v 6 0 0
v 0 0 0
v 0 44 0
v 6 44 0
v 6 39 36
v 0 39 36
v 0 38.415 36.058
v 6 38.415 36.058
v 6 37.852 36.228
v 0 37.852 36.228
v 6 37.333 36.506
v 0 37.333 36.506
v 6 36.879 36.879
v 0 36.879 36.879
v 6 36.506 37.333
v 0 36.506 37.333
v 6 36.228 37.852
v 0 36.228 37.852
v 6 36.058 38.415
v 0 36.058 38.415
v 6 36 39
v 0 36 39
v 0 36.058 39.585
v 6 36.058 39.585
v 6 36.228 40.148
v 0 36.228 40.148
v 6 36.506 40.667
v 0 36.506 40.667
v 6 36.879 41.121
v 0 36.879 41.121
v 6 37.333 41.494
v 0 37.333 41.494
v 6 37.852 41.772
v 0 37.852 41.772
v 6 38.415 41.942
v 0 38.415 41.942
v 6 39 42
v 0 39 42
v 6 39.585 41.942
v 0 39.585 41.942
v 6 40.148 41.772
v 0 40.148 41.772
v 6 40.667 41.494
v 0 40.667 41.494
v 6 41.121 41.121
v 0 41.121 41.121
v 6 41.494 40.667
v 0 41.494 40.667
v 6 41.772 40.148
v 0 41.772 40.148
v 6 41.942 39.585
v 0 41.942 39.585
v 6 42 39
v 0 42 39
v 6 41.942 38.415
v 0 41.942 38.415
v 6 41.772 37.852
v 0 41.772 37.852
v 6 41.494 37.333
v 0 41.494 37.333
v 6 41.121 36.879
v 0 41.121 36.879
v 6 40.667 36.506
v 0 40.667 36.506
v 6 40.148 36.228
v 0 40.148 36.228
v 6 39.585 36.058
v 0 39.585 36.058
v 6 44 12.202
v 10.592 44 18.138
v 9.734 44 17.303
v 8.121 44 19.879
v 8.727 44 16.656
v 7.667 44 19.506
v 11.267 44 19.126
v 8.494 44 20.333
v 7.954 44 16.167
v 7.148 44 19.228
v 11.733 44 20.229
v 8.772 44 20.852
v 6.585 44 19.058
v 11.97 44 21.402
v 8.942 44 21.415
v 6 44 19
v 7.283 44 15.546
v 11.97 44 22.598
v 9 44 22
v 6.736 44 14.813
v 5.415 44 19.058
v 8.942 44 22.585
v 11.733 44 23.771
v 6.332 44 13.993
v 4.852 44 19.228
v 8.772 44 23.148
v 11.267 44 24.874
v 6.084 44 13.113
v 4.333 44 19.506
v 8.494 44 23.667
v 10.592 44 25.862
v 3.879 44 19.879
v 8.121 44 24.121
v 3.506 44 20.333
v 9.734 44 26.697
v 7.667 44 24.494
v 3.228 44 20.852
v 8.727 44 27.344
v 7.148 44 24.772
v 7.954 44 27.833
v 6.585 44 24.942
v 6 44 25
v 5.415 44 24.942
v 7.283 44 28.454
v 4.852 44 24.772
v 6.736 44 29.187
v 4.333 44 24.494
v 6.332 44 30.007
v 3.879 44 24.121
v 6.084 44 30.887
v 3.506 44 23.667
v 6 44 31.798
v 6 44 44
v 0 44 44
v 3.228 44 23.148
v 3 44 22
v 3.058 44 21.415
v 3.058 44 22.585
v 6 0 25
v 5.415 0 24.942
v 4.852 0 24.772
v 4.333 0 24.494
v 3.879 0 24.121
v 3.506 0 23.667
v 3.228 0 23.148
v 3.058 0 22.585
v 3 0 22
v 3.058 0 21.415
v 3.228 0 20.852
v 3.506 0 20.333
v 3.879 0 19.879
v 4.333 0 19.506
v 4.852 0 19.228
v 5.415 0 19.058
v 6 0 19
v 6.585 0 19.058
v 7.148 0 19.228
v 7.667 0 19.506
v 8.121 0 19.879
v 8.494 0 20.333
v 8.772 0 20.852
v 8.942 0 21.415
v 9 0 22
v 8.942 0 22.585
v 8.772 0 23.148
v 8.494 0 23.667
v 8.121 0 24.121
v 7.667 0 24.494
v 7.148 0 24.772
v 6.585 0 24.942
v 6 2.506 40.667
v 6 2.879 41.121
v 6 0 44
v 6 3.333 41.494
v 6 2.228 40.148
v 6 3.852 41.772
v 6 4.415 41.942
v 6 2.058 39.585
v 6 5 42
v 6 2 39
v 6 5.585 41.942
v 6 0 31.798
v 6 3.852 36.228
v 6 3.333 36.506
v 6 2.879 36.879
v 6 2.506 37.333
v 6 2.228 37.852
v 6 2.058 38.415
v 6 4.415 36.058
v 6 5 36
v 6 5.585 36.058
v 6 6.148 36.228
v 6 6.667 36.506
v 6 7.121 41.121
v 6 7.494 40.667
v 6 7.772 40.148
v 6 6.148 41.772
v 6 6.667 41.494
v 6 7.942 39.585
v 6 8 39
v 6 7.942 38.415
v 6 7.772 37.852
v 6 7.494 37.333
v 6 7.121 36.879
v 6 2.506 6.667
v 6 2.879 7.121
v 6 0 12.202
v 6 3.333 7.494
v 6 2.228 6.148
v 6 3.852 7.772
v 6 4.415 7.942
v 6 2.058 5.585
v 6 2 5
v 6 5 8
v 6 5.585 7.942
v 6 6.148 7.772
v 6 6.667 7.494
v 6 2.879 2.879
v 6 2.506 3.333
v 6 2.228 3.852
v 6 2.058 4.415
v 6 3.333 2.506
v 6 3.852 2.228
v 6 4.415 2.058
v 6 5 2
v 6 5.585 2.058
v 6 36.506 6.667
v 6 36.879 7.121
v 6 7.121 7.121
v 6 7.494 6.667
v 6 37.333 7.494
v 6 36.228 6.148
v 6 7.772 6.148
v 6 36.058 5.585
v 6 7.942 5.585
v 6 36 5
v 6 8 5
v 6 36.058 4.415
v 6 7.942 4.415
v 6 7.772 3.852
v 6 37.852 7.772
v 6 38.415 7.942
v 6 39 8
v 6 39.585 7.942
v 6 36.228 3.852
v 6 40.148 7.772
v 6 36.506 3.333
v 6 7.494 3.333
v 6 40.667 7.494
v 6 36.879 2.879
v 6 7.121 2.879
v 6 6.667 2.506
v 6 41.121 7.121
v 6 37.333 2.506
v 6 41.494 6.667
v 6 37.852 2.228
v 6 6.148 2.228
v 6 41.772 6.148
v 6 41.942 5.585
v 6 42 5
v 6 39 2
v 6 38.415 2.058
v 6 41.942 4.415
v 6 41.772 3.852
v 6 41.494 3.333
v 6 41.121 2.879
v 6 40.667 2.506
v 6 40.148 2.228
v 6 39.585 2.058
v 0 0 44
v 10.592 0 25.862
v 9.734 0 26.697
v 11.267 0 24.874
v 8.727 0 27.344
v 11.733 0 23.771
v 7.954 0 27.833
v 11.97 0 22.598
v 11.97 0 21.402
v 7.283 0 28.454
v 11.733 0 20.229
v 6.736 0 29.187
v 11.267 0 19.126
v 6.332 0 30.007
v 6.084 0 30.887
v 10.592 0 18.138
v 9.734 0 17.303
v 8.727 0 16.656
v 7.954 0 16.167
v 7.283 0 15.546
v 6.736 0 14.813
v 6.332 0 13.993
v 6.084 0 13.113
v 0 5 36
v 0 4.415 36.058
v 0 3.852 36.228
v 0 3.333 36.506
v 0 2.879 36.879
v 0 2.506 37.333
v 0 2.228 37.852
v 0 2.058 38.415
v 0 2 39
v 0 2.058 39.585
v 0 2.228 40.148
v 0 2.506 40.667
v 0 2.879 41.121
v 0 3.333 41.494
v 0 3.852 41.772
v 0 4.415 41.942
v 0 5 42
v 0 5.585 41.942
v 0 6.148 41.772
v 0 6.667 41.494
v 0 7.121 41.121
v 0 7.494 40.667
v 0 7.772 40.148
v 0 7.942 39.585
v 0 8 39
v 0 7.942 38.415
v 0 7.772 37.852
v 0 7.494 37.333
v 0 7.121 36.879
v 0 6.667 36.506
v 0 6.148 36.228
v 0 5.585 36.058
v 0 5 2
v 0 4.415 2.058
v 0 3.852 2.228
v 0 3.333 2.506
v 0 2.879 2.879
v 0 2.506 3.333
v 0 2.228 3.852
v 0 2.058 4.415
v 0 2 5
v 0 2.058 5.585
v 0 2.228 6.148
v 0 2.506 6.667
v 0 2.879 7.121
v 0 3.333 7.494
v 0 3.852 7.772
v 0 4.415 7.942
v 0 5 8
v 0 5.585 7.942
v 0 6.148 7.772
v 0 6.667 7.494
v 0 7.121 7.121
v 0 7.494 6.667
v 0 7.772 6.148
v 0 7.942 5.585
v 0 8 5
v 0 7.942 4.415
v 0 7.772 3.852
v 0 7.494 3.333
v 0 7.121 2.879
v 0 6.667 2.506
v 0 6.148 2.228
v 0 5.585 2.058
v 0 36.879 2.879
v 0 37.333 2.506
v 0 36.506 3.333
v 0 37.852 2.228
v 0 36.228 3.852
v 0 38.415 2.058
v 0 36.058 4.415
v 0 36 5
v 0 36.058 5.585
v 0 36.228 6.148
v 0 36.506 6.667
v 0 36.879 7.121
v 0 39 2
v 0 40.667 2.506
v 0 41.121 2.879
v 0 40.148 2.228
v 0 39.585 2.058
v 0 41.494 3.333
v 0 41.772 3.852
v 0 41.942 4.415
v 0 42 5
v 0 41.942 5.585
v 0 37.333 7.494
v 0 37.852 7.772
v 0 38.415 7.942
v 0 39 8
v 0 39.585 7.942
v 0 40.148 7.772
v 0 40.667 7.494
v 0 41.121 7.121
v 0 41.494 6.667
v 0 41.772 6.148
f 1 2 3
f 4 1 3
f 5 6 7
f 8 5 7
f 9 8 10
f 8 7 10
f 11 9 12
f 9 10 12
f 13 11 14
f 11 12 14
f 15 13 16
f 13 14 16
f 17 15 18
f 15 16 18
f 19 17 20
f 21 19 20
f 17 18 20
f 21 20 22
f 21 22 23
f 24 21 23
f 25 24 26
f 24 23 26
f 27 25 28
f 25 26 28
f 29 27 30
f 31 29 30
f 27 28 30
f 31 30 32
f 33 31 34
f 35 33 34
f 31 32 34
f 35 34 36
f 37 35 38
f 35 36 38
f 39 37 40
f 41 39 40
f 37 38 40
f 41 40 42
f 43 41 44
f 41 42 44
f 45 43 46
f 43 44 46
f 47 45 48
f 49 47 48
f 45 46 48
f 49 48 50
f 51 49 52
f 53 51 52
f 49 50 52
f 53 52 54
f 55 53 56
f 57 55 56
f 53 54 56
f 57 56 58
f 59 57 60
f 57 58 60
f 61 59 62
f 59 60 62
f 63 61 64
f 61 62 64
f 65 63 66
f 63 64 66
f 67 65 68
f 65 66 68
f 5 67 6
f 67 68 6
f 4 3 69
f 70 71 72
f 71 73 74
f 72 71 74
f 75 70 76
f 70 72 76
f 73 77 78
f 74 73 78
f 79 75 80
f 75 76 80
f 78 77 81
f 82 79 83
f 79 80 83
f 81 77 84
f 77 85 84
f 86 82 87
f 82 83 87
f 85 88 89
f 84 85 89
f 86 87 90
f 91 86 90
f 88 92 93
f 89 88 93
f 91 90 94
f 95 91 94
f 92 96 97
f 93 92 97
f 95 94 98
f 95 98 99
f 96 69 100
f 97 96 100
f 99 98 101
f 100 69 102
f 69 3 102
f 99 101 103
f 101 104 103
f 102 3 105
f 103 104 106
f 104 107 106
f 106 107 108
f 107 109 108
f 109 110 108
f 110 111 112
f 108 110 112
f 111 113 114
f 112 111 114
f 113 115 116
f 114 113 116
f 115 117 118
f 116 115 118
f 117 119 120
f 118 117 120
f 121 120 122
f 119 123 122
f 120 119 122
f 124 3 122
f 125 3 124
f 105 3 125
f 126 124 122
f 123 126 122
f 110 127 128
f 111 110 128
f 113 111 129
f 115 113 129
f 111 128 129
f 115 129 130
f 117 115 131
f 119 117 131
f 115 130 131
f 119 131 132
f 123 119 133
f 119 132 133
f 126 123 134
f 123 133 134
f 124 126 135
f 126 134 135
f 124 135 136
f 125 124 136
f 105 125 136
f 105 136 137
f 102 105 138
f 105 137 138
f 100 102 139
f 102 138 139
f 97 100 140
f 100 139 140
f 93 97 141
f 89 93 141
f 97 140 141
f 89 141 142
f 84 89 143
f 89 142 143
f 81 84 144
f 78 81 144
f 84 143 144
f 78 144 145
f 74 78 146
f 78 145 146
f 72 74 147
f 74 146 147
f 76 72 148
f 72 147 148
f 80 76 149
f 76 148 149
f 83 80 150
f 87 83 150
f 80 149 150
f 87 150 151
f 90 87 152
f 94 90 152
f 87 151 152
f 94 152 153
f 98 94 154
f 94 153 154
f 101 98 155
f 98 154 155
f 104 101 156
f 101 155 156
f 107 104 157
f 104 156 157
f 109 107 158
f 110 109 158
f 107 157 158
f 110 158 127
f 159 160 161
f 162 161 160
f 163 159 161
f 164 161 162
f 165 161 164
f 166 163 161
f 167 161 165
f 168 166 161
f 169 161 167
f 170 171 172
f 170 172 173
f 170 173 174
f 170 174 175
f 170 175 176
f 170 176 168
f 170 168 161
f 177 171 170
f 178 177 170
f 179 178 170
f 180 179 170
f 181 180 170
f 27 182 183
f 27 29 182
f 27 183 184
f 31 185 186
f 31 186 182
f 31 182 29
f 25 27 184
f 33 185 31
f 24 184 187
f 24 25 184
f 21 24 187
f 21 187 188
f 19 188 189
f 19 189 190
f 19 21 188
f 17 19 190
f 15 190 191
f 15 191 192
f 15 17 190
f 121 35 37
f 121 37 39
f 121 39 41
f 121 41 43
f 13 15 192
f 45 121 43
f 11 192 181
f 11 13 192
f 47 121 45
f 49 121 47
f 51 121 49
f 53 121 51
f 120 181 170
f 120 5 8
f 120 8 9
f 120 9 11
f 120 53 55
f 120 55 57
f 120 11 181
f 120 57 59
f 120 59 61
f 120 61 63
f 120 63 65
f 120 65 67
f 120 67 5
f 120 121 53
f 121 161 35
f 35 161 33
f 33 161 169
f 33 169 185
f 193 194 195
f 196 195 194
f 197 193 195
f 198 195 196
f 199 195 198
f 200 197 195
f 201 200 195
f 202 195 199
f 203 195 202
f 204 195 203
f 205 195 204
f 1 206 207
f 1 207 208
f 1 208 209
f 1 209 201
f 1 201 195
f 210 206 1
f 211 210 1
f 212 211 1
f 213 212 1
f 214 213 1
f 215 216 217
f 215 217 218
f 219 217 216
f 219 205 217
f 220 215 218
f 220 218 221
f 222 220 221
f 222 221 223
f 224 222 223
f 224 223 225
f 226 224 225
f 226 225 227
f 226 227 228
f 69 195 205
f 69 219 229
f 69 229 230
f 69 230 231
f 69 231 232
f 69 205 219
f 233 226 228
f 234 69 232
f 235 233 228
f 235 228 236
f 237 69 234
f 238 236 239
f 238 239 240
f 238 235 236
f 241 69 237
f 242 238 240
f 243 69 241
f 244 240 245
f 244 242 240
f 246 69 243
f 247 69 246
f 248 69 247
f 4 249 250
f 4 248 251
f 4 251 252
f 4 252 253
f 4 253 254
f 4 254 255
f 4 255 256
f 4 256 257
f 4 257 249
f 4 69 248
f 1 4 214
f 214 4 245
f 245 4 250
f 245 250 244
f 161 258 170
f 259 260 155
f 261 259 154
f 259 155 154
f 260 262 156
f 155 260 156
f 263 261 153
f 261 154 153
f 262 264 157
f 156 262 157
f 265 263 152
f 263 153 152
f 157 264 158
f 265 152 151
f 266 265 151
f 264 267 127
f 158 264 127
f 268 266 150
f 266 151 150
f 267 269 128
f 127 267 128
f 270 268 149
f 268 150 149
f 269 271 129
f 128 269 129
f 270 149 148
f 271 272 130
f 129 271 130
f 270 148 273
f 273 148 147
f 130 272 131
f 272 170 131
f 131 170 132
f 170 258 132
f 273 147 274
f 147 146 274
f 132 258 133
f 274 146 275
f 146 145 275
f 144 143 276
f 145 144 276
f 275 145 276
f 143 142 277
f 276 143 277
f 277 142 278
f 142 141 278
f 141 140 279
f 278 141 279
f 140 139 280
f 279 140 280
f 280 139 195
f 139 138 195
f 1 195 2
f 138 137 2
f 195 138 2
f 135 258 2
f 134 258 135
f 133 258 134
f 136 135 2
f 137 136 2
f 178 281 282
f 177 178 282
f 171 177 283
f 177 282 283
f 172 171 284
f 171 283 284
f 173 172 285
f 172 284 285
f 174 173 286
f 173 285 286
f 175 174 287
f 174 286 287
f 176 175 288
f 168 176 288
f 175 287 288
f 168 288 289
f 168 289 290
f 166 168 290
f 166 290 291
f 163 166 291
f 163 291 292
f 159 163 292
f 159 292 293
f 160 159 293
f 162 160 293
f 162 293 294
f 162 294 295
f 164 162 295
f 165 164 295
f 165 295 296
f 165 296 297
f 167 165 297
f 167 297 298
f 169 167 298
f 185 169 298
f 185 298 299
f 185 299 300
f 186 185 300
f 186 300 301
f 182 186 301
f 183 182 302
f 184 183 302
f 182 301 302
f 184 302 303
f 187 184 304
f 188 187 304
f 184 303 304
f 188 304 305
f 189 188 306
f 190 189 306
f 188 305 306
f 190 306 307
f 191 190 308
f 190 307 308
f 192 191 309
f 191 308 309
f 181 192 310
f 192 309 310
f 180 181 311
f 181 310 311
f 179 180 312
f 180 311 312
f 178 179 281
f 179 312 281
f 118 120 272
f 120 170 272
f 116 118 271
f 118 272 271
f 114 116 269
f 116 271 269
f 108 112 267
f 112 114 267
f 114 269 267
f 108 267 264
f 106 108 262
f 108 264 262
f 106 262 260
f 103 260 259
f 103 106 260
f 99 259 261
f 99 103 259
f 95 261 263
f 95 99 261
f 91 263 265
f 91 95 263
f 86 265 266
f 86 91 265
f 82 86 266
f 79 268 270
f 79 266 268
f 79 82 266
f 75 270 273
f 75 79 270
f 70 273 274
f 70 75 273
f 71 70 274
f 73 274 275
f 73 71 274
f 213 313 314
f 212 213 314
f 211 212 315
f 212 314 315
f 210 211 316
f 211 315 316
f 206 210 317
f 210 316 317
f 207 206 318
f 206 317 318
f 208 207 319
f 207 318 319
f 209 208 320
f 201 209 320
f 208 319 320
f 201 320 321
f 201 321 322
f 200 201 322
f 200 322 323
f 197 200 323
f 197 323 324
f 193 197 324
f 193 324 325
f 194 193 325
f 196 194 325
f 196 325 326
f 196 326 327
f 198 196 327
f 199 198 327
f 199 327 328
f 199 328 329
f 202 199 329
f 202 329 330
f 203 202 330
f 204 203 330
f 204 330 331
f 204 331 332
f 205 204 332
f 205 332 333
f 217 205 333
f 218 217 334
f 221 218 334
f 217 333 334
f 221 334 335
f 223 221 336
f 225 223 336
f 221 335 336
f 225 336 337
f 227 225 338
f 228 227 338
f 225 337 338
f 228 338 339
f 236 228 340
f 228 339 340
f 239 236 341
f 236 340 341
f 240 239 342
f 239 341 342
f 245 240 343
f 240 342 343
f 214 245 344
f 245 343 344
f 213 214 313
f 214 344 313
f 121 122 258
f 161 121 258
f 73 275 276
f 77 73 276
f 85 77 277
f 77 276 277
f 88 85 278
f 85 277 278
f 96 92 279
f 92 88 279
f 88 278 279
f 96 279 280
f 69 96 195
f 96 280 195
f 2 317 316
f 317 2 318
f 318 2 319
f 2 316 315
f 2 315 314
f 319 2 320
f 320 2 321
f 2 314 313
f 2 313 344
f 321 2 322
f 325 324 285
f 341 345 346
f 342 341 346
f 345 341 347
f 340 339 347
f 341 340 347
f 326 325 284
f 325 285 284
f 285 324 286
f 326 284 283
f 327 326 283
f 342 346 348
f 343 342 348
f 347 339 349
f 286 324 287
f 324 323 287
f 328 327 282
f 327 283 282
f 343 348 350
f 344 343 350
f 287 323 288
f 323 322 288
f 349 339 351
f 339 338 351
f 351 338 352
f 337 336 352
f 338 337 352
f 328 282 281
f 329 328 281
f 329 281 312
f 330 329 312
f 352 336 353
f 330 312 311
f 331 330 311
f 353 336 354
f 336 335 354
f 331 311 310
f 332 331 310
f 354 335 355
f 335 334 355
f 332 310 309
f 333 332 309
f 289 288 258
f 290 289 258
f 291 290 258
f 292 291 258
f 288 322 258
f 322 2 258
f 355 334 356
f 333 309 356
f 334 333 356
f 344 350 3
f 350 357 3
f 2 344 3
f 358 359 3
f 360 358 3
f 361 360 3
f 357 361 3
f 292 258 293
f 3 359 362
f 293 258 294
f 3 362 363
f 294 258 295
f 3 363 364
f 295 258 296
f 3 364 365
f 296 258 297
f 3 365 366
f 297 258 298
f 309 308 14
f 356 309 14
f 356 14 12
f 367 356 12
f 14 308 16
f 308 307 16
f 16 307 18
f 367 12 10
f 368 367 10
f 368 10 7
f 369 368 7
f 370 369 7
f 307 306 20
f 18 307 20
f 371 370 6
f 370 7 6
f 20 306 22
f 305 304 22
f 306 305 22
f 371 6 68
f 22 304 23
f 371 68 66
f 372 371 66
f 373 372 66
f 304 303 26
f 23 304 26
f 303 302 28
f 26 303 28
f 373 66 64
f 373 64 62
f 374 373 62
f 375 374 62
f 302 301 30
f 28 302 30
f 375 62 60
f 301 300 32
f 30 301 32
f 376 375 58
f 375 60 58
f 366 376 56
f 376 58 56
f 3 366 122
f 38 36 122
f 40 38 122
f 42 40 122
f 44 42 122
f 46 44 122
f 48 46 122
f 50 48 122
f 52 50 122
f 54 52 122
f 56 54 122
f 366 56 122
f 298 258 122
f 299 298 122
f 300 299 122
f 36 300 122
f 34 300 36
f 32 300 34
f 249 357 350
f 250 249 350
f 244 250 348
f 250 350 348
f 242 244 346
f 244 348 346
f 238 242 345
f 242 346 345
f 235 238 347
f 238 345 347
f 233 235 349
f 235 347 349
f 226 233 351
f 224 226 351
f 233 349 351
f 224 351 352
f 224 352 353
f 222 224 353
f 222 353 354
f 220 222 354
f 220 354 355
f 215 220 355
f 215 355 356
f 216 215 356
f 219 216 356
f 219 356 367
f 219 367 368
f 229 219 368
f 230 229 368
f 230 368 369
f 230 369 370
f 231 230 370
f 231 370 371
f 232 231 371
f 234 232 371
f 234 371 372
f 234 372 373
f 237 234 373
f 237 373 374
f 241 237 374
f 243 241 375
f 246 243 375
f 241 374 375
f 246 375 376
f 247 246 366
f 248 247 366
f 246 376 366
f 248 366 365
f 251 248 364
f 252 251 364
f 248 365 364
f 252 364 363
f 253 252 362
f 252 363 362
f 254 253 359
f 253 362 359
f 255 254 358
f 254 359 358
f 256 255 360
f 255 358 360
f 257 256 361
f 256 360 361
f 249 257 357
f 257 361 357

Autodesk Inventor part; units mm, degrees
ref_plane "YZ Plane" through (0, 0, 0) normal (1, 0, 0) x (0, 1, 0)
ref_plane "XZ Plane" through (0, 0, 0) normal (0, 1, 0) x (-1, 0, 0)
ref_plane "XY Plane" through (0, 0, 0) normal (0, 0, 1) x (1, 0, 0)
sketch "Sketch1" plane through (0, 0, 0) normal (1, 0, 0) x (0, 1, 0)
  line L0 (0, 0) -> (44, 0)
  line L1 (44, 0) -> (44, 44)
  line L2 (44, 44) -> (0, 44)
  line L3 (0, 44) -> (0, 0)
  dimension "d2" = 44
extrude "Extrusion1" add sketch "Sketch1" along normal blind 12
sketch "Sketch2" plane through (12, 0, 0) normal (1, 0, 0) x (0, 0, -1)
  line L0 (-44, 44) -> (-44, 0) projected
  line L1 (0, 44) -> (-44, 44) projected
  point P0 (0, 0)
  point P1 (-5, 5)
  point P2 (-39, 5)
  point P3 (-39, 39)
  point P4 (-5, 39)
  dimension "d3" = 5
  dimension "d4" = 5
  dimension "d5" = 5
  dimension "d6" = 5
hole "Hole1" at (12, 5, 5) at (12, 5, 39) at (12, 39, 39) at (12, 39, 5) direction (-1, 0, 0) diameter 6 end through all
sketch "Sketch3" plane through (0, 44, 44) normal (0, 1, 0) x (1, 0, 0)
  line L0 (0, 0) -> (12, 0) projected
  point P0 (0, 44)
  point P1 (6, 22)
  dimension "d14" = 6
  dimension "d15" = 22
hole "Hole2" at (6, 44, 22) direction (0, -1, 0) diameter 6 end through all
sketch "Sketch4" plane through (0, 44, 44) normal (0, 1, 0) x (1, 0, 0)
  circle A0 centre (6, 22) radius 3 projected
  line L0 (0, 44) -> (0, 0) projected
  line L1 (0, 0) -> (12, 0) projected
  line L2 (12, 44) -> (12, 0) projected
  line L3 (0, 44) -> (12, 44) projected
  circle A1 centre (6, 22) radius 3 projected
  circle A2 centre (6, 22) radius 6
  line L4 (0, 44) -> (12, 44) projected
  line L5 (0, 0) -> (12, 0) projected
  line L6 (12, 44) -> (12, 0)
  line L7 (12, 0) -> (6, 0)
  line L8 (6, 0) -> (6, 44)
  line L9 (6, 44) -> (12, 44)
  line L10 (12, 44) -> (12, 0) projected
  point P0 (6, 28)
  point P1 (12, 22)
  point P2 (6, 16)
  point P3 (6, 0)
  dimension "d23" = 6
extrude "Extrusion2" cut sketch "Sketch4" against normal blind 50 contours L8 L3 L2 A2 | A2 L2 L1 L8
fillet "Fillet1" radius 5 2 edges at (6, 22, 28) (6, 22, 16)
equation "\"d4\" = d3"
equation "\"d5\" = d3"
equation "\"d6\" = d3"
properties part number "Piston Mount"
